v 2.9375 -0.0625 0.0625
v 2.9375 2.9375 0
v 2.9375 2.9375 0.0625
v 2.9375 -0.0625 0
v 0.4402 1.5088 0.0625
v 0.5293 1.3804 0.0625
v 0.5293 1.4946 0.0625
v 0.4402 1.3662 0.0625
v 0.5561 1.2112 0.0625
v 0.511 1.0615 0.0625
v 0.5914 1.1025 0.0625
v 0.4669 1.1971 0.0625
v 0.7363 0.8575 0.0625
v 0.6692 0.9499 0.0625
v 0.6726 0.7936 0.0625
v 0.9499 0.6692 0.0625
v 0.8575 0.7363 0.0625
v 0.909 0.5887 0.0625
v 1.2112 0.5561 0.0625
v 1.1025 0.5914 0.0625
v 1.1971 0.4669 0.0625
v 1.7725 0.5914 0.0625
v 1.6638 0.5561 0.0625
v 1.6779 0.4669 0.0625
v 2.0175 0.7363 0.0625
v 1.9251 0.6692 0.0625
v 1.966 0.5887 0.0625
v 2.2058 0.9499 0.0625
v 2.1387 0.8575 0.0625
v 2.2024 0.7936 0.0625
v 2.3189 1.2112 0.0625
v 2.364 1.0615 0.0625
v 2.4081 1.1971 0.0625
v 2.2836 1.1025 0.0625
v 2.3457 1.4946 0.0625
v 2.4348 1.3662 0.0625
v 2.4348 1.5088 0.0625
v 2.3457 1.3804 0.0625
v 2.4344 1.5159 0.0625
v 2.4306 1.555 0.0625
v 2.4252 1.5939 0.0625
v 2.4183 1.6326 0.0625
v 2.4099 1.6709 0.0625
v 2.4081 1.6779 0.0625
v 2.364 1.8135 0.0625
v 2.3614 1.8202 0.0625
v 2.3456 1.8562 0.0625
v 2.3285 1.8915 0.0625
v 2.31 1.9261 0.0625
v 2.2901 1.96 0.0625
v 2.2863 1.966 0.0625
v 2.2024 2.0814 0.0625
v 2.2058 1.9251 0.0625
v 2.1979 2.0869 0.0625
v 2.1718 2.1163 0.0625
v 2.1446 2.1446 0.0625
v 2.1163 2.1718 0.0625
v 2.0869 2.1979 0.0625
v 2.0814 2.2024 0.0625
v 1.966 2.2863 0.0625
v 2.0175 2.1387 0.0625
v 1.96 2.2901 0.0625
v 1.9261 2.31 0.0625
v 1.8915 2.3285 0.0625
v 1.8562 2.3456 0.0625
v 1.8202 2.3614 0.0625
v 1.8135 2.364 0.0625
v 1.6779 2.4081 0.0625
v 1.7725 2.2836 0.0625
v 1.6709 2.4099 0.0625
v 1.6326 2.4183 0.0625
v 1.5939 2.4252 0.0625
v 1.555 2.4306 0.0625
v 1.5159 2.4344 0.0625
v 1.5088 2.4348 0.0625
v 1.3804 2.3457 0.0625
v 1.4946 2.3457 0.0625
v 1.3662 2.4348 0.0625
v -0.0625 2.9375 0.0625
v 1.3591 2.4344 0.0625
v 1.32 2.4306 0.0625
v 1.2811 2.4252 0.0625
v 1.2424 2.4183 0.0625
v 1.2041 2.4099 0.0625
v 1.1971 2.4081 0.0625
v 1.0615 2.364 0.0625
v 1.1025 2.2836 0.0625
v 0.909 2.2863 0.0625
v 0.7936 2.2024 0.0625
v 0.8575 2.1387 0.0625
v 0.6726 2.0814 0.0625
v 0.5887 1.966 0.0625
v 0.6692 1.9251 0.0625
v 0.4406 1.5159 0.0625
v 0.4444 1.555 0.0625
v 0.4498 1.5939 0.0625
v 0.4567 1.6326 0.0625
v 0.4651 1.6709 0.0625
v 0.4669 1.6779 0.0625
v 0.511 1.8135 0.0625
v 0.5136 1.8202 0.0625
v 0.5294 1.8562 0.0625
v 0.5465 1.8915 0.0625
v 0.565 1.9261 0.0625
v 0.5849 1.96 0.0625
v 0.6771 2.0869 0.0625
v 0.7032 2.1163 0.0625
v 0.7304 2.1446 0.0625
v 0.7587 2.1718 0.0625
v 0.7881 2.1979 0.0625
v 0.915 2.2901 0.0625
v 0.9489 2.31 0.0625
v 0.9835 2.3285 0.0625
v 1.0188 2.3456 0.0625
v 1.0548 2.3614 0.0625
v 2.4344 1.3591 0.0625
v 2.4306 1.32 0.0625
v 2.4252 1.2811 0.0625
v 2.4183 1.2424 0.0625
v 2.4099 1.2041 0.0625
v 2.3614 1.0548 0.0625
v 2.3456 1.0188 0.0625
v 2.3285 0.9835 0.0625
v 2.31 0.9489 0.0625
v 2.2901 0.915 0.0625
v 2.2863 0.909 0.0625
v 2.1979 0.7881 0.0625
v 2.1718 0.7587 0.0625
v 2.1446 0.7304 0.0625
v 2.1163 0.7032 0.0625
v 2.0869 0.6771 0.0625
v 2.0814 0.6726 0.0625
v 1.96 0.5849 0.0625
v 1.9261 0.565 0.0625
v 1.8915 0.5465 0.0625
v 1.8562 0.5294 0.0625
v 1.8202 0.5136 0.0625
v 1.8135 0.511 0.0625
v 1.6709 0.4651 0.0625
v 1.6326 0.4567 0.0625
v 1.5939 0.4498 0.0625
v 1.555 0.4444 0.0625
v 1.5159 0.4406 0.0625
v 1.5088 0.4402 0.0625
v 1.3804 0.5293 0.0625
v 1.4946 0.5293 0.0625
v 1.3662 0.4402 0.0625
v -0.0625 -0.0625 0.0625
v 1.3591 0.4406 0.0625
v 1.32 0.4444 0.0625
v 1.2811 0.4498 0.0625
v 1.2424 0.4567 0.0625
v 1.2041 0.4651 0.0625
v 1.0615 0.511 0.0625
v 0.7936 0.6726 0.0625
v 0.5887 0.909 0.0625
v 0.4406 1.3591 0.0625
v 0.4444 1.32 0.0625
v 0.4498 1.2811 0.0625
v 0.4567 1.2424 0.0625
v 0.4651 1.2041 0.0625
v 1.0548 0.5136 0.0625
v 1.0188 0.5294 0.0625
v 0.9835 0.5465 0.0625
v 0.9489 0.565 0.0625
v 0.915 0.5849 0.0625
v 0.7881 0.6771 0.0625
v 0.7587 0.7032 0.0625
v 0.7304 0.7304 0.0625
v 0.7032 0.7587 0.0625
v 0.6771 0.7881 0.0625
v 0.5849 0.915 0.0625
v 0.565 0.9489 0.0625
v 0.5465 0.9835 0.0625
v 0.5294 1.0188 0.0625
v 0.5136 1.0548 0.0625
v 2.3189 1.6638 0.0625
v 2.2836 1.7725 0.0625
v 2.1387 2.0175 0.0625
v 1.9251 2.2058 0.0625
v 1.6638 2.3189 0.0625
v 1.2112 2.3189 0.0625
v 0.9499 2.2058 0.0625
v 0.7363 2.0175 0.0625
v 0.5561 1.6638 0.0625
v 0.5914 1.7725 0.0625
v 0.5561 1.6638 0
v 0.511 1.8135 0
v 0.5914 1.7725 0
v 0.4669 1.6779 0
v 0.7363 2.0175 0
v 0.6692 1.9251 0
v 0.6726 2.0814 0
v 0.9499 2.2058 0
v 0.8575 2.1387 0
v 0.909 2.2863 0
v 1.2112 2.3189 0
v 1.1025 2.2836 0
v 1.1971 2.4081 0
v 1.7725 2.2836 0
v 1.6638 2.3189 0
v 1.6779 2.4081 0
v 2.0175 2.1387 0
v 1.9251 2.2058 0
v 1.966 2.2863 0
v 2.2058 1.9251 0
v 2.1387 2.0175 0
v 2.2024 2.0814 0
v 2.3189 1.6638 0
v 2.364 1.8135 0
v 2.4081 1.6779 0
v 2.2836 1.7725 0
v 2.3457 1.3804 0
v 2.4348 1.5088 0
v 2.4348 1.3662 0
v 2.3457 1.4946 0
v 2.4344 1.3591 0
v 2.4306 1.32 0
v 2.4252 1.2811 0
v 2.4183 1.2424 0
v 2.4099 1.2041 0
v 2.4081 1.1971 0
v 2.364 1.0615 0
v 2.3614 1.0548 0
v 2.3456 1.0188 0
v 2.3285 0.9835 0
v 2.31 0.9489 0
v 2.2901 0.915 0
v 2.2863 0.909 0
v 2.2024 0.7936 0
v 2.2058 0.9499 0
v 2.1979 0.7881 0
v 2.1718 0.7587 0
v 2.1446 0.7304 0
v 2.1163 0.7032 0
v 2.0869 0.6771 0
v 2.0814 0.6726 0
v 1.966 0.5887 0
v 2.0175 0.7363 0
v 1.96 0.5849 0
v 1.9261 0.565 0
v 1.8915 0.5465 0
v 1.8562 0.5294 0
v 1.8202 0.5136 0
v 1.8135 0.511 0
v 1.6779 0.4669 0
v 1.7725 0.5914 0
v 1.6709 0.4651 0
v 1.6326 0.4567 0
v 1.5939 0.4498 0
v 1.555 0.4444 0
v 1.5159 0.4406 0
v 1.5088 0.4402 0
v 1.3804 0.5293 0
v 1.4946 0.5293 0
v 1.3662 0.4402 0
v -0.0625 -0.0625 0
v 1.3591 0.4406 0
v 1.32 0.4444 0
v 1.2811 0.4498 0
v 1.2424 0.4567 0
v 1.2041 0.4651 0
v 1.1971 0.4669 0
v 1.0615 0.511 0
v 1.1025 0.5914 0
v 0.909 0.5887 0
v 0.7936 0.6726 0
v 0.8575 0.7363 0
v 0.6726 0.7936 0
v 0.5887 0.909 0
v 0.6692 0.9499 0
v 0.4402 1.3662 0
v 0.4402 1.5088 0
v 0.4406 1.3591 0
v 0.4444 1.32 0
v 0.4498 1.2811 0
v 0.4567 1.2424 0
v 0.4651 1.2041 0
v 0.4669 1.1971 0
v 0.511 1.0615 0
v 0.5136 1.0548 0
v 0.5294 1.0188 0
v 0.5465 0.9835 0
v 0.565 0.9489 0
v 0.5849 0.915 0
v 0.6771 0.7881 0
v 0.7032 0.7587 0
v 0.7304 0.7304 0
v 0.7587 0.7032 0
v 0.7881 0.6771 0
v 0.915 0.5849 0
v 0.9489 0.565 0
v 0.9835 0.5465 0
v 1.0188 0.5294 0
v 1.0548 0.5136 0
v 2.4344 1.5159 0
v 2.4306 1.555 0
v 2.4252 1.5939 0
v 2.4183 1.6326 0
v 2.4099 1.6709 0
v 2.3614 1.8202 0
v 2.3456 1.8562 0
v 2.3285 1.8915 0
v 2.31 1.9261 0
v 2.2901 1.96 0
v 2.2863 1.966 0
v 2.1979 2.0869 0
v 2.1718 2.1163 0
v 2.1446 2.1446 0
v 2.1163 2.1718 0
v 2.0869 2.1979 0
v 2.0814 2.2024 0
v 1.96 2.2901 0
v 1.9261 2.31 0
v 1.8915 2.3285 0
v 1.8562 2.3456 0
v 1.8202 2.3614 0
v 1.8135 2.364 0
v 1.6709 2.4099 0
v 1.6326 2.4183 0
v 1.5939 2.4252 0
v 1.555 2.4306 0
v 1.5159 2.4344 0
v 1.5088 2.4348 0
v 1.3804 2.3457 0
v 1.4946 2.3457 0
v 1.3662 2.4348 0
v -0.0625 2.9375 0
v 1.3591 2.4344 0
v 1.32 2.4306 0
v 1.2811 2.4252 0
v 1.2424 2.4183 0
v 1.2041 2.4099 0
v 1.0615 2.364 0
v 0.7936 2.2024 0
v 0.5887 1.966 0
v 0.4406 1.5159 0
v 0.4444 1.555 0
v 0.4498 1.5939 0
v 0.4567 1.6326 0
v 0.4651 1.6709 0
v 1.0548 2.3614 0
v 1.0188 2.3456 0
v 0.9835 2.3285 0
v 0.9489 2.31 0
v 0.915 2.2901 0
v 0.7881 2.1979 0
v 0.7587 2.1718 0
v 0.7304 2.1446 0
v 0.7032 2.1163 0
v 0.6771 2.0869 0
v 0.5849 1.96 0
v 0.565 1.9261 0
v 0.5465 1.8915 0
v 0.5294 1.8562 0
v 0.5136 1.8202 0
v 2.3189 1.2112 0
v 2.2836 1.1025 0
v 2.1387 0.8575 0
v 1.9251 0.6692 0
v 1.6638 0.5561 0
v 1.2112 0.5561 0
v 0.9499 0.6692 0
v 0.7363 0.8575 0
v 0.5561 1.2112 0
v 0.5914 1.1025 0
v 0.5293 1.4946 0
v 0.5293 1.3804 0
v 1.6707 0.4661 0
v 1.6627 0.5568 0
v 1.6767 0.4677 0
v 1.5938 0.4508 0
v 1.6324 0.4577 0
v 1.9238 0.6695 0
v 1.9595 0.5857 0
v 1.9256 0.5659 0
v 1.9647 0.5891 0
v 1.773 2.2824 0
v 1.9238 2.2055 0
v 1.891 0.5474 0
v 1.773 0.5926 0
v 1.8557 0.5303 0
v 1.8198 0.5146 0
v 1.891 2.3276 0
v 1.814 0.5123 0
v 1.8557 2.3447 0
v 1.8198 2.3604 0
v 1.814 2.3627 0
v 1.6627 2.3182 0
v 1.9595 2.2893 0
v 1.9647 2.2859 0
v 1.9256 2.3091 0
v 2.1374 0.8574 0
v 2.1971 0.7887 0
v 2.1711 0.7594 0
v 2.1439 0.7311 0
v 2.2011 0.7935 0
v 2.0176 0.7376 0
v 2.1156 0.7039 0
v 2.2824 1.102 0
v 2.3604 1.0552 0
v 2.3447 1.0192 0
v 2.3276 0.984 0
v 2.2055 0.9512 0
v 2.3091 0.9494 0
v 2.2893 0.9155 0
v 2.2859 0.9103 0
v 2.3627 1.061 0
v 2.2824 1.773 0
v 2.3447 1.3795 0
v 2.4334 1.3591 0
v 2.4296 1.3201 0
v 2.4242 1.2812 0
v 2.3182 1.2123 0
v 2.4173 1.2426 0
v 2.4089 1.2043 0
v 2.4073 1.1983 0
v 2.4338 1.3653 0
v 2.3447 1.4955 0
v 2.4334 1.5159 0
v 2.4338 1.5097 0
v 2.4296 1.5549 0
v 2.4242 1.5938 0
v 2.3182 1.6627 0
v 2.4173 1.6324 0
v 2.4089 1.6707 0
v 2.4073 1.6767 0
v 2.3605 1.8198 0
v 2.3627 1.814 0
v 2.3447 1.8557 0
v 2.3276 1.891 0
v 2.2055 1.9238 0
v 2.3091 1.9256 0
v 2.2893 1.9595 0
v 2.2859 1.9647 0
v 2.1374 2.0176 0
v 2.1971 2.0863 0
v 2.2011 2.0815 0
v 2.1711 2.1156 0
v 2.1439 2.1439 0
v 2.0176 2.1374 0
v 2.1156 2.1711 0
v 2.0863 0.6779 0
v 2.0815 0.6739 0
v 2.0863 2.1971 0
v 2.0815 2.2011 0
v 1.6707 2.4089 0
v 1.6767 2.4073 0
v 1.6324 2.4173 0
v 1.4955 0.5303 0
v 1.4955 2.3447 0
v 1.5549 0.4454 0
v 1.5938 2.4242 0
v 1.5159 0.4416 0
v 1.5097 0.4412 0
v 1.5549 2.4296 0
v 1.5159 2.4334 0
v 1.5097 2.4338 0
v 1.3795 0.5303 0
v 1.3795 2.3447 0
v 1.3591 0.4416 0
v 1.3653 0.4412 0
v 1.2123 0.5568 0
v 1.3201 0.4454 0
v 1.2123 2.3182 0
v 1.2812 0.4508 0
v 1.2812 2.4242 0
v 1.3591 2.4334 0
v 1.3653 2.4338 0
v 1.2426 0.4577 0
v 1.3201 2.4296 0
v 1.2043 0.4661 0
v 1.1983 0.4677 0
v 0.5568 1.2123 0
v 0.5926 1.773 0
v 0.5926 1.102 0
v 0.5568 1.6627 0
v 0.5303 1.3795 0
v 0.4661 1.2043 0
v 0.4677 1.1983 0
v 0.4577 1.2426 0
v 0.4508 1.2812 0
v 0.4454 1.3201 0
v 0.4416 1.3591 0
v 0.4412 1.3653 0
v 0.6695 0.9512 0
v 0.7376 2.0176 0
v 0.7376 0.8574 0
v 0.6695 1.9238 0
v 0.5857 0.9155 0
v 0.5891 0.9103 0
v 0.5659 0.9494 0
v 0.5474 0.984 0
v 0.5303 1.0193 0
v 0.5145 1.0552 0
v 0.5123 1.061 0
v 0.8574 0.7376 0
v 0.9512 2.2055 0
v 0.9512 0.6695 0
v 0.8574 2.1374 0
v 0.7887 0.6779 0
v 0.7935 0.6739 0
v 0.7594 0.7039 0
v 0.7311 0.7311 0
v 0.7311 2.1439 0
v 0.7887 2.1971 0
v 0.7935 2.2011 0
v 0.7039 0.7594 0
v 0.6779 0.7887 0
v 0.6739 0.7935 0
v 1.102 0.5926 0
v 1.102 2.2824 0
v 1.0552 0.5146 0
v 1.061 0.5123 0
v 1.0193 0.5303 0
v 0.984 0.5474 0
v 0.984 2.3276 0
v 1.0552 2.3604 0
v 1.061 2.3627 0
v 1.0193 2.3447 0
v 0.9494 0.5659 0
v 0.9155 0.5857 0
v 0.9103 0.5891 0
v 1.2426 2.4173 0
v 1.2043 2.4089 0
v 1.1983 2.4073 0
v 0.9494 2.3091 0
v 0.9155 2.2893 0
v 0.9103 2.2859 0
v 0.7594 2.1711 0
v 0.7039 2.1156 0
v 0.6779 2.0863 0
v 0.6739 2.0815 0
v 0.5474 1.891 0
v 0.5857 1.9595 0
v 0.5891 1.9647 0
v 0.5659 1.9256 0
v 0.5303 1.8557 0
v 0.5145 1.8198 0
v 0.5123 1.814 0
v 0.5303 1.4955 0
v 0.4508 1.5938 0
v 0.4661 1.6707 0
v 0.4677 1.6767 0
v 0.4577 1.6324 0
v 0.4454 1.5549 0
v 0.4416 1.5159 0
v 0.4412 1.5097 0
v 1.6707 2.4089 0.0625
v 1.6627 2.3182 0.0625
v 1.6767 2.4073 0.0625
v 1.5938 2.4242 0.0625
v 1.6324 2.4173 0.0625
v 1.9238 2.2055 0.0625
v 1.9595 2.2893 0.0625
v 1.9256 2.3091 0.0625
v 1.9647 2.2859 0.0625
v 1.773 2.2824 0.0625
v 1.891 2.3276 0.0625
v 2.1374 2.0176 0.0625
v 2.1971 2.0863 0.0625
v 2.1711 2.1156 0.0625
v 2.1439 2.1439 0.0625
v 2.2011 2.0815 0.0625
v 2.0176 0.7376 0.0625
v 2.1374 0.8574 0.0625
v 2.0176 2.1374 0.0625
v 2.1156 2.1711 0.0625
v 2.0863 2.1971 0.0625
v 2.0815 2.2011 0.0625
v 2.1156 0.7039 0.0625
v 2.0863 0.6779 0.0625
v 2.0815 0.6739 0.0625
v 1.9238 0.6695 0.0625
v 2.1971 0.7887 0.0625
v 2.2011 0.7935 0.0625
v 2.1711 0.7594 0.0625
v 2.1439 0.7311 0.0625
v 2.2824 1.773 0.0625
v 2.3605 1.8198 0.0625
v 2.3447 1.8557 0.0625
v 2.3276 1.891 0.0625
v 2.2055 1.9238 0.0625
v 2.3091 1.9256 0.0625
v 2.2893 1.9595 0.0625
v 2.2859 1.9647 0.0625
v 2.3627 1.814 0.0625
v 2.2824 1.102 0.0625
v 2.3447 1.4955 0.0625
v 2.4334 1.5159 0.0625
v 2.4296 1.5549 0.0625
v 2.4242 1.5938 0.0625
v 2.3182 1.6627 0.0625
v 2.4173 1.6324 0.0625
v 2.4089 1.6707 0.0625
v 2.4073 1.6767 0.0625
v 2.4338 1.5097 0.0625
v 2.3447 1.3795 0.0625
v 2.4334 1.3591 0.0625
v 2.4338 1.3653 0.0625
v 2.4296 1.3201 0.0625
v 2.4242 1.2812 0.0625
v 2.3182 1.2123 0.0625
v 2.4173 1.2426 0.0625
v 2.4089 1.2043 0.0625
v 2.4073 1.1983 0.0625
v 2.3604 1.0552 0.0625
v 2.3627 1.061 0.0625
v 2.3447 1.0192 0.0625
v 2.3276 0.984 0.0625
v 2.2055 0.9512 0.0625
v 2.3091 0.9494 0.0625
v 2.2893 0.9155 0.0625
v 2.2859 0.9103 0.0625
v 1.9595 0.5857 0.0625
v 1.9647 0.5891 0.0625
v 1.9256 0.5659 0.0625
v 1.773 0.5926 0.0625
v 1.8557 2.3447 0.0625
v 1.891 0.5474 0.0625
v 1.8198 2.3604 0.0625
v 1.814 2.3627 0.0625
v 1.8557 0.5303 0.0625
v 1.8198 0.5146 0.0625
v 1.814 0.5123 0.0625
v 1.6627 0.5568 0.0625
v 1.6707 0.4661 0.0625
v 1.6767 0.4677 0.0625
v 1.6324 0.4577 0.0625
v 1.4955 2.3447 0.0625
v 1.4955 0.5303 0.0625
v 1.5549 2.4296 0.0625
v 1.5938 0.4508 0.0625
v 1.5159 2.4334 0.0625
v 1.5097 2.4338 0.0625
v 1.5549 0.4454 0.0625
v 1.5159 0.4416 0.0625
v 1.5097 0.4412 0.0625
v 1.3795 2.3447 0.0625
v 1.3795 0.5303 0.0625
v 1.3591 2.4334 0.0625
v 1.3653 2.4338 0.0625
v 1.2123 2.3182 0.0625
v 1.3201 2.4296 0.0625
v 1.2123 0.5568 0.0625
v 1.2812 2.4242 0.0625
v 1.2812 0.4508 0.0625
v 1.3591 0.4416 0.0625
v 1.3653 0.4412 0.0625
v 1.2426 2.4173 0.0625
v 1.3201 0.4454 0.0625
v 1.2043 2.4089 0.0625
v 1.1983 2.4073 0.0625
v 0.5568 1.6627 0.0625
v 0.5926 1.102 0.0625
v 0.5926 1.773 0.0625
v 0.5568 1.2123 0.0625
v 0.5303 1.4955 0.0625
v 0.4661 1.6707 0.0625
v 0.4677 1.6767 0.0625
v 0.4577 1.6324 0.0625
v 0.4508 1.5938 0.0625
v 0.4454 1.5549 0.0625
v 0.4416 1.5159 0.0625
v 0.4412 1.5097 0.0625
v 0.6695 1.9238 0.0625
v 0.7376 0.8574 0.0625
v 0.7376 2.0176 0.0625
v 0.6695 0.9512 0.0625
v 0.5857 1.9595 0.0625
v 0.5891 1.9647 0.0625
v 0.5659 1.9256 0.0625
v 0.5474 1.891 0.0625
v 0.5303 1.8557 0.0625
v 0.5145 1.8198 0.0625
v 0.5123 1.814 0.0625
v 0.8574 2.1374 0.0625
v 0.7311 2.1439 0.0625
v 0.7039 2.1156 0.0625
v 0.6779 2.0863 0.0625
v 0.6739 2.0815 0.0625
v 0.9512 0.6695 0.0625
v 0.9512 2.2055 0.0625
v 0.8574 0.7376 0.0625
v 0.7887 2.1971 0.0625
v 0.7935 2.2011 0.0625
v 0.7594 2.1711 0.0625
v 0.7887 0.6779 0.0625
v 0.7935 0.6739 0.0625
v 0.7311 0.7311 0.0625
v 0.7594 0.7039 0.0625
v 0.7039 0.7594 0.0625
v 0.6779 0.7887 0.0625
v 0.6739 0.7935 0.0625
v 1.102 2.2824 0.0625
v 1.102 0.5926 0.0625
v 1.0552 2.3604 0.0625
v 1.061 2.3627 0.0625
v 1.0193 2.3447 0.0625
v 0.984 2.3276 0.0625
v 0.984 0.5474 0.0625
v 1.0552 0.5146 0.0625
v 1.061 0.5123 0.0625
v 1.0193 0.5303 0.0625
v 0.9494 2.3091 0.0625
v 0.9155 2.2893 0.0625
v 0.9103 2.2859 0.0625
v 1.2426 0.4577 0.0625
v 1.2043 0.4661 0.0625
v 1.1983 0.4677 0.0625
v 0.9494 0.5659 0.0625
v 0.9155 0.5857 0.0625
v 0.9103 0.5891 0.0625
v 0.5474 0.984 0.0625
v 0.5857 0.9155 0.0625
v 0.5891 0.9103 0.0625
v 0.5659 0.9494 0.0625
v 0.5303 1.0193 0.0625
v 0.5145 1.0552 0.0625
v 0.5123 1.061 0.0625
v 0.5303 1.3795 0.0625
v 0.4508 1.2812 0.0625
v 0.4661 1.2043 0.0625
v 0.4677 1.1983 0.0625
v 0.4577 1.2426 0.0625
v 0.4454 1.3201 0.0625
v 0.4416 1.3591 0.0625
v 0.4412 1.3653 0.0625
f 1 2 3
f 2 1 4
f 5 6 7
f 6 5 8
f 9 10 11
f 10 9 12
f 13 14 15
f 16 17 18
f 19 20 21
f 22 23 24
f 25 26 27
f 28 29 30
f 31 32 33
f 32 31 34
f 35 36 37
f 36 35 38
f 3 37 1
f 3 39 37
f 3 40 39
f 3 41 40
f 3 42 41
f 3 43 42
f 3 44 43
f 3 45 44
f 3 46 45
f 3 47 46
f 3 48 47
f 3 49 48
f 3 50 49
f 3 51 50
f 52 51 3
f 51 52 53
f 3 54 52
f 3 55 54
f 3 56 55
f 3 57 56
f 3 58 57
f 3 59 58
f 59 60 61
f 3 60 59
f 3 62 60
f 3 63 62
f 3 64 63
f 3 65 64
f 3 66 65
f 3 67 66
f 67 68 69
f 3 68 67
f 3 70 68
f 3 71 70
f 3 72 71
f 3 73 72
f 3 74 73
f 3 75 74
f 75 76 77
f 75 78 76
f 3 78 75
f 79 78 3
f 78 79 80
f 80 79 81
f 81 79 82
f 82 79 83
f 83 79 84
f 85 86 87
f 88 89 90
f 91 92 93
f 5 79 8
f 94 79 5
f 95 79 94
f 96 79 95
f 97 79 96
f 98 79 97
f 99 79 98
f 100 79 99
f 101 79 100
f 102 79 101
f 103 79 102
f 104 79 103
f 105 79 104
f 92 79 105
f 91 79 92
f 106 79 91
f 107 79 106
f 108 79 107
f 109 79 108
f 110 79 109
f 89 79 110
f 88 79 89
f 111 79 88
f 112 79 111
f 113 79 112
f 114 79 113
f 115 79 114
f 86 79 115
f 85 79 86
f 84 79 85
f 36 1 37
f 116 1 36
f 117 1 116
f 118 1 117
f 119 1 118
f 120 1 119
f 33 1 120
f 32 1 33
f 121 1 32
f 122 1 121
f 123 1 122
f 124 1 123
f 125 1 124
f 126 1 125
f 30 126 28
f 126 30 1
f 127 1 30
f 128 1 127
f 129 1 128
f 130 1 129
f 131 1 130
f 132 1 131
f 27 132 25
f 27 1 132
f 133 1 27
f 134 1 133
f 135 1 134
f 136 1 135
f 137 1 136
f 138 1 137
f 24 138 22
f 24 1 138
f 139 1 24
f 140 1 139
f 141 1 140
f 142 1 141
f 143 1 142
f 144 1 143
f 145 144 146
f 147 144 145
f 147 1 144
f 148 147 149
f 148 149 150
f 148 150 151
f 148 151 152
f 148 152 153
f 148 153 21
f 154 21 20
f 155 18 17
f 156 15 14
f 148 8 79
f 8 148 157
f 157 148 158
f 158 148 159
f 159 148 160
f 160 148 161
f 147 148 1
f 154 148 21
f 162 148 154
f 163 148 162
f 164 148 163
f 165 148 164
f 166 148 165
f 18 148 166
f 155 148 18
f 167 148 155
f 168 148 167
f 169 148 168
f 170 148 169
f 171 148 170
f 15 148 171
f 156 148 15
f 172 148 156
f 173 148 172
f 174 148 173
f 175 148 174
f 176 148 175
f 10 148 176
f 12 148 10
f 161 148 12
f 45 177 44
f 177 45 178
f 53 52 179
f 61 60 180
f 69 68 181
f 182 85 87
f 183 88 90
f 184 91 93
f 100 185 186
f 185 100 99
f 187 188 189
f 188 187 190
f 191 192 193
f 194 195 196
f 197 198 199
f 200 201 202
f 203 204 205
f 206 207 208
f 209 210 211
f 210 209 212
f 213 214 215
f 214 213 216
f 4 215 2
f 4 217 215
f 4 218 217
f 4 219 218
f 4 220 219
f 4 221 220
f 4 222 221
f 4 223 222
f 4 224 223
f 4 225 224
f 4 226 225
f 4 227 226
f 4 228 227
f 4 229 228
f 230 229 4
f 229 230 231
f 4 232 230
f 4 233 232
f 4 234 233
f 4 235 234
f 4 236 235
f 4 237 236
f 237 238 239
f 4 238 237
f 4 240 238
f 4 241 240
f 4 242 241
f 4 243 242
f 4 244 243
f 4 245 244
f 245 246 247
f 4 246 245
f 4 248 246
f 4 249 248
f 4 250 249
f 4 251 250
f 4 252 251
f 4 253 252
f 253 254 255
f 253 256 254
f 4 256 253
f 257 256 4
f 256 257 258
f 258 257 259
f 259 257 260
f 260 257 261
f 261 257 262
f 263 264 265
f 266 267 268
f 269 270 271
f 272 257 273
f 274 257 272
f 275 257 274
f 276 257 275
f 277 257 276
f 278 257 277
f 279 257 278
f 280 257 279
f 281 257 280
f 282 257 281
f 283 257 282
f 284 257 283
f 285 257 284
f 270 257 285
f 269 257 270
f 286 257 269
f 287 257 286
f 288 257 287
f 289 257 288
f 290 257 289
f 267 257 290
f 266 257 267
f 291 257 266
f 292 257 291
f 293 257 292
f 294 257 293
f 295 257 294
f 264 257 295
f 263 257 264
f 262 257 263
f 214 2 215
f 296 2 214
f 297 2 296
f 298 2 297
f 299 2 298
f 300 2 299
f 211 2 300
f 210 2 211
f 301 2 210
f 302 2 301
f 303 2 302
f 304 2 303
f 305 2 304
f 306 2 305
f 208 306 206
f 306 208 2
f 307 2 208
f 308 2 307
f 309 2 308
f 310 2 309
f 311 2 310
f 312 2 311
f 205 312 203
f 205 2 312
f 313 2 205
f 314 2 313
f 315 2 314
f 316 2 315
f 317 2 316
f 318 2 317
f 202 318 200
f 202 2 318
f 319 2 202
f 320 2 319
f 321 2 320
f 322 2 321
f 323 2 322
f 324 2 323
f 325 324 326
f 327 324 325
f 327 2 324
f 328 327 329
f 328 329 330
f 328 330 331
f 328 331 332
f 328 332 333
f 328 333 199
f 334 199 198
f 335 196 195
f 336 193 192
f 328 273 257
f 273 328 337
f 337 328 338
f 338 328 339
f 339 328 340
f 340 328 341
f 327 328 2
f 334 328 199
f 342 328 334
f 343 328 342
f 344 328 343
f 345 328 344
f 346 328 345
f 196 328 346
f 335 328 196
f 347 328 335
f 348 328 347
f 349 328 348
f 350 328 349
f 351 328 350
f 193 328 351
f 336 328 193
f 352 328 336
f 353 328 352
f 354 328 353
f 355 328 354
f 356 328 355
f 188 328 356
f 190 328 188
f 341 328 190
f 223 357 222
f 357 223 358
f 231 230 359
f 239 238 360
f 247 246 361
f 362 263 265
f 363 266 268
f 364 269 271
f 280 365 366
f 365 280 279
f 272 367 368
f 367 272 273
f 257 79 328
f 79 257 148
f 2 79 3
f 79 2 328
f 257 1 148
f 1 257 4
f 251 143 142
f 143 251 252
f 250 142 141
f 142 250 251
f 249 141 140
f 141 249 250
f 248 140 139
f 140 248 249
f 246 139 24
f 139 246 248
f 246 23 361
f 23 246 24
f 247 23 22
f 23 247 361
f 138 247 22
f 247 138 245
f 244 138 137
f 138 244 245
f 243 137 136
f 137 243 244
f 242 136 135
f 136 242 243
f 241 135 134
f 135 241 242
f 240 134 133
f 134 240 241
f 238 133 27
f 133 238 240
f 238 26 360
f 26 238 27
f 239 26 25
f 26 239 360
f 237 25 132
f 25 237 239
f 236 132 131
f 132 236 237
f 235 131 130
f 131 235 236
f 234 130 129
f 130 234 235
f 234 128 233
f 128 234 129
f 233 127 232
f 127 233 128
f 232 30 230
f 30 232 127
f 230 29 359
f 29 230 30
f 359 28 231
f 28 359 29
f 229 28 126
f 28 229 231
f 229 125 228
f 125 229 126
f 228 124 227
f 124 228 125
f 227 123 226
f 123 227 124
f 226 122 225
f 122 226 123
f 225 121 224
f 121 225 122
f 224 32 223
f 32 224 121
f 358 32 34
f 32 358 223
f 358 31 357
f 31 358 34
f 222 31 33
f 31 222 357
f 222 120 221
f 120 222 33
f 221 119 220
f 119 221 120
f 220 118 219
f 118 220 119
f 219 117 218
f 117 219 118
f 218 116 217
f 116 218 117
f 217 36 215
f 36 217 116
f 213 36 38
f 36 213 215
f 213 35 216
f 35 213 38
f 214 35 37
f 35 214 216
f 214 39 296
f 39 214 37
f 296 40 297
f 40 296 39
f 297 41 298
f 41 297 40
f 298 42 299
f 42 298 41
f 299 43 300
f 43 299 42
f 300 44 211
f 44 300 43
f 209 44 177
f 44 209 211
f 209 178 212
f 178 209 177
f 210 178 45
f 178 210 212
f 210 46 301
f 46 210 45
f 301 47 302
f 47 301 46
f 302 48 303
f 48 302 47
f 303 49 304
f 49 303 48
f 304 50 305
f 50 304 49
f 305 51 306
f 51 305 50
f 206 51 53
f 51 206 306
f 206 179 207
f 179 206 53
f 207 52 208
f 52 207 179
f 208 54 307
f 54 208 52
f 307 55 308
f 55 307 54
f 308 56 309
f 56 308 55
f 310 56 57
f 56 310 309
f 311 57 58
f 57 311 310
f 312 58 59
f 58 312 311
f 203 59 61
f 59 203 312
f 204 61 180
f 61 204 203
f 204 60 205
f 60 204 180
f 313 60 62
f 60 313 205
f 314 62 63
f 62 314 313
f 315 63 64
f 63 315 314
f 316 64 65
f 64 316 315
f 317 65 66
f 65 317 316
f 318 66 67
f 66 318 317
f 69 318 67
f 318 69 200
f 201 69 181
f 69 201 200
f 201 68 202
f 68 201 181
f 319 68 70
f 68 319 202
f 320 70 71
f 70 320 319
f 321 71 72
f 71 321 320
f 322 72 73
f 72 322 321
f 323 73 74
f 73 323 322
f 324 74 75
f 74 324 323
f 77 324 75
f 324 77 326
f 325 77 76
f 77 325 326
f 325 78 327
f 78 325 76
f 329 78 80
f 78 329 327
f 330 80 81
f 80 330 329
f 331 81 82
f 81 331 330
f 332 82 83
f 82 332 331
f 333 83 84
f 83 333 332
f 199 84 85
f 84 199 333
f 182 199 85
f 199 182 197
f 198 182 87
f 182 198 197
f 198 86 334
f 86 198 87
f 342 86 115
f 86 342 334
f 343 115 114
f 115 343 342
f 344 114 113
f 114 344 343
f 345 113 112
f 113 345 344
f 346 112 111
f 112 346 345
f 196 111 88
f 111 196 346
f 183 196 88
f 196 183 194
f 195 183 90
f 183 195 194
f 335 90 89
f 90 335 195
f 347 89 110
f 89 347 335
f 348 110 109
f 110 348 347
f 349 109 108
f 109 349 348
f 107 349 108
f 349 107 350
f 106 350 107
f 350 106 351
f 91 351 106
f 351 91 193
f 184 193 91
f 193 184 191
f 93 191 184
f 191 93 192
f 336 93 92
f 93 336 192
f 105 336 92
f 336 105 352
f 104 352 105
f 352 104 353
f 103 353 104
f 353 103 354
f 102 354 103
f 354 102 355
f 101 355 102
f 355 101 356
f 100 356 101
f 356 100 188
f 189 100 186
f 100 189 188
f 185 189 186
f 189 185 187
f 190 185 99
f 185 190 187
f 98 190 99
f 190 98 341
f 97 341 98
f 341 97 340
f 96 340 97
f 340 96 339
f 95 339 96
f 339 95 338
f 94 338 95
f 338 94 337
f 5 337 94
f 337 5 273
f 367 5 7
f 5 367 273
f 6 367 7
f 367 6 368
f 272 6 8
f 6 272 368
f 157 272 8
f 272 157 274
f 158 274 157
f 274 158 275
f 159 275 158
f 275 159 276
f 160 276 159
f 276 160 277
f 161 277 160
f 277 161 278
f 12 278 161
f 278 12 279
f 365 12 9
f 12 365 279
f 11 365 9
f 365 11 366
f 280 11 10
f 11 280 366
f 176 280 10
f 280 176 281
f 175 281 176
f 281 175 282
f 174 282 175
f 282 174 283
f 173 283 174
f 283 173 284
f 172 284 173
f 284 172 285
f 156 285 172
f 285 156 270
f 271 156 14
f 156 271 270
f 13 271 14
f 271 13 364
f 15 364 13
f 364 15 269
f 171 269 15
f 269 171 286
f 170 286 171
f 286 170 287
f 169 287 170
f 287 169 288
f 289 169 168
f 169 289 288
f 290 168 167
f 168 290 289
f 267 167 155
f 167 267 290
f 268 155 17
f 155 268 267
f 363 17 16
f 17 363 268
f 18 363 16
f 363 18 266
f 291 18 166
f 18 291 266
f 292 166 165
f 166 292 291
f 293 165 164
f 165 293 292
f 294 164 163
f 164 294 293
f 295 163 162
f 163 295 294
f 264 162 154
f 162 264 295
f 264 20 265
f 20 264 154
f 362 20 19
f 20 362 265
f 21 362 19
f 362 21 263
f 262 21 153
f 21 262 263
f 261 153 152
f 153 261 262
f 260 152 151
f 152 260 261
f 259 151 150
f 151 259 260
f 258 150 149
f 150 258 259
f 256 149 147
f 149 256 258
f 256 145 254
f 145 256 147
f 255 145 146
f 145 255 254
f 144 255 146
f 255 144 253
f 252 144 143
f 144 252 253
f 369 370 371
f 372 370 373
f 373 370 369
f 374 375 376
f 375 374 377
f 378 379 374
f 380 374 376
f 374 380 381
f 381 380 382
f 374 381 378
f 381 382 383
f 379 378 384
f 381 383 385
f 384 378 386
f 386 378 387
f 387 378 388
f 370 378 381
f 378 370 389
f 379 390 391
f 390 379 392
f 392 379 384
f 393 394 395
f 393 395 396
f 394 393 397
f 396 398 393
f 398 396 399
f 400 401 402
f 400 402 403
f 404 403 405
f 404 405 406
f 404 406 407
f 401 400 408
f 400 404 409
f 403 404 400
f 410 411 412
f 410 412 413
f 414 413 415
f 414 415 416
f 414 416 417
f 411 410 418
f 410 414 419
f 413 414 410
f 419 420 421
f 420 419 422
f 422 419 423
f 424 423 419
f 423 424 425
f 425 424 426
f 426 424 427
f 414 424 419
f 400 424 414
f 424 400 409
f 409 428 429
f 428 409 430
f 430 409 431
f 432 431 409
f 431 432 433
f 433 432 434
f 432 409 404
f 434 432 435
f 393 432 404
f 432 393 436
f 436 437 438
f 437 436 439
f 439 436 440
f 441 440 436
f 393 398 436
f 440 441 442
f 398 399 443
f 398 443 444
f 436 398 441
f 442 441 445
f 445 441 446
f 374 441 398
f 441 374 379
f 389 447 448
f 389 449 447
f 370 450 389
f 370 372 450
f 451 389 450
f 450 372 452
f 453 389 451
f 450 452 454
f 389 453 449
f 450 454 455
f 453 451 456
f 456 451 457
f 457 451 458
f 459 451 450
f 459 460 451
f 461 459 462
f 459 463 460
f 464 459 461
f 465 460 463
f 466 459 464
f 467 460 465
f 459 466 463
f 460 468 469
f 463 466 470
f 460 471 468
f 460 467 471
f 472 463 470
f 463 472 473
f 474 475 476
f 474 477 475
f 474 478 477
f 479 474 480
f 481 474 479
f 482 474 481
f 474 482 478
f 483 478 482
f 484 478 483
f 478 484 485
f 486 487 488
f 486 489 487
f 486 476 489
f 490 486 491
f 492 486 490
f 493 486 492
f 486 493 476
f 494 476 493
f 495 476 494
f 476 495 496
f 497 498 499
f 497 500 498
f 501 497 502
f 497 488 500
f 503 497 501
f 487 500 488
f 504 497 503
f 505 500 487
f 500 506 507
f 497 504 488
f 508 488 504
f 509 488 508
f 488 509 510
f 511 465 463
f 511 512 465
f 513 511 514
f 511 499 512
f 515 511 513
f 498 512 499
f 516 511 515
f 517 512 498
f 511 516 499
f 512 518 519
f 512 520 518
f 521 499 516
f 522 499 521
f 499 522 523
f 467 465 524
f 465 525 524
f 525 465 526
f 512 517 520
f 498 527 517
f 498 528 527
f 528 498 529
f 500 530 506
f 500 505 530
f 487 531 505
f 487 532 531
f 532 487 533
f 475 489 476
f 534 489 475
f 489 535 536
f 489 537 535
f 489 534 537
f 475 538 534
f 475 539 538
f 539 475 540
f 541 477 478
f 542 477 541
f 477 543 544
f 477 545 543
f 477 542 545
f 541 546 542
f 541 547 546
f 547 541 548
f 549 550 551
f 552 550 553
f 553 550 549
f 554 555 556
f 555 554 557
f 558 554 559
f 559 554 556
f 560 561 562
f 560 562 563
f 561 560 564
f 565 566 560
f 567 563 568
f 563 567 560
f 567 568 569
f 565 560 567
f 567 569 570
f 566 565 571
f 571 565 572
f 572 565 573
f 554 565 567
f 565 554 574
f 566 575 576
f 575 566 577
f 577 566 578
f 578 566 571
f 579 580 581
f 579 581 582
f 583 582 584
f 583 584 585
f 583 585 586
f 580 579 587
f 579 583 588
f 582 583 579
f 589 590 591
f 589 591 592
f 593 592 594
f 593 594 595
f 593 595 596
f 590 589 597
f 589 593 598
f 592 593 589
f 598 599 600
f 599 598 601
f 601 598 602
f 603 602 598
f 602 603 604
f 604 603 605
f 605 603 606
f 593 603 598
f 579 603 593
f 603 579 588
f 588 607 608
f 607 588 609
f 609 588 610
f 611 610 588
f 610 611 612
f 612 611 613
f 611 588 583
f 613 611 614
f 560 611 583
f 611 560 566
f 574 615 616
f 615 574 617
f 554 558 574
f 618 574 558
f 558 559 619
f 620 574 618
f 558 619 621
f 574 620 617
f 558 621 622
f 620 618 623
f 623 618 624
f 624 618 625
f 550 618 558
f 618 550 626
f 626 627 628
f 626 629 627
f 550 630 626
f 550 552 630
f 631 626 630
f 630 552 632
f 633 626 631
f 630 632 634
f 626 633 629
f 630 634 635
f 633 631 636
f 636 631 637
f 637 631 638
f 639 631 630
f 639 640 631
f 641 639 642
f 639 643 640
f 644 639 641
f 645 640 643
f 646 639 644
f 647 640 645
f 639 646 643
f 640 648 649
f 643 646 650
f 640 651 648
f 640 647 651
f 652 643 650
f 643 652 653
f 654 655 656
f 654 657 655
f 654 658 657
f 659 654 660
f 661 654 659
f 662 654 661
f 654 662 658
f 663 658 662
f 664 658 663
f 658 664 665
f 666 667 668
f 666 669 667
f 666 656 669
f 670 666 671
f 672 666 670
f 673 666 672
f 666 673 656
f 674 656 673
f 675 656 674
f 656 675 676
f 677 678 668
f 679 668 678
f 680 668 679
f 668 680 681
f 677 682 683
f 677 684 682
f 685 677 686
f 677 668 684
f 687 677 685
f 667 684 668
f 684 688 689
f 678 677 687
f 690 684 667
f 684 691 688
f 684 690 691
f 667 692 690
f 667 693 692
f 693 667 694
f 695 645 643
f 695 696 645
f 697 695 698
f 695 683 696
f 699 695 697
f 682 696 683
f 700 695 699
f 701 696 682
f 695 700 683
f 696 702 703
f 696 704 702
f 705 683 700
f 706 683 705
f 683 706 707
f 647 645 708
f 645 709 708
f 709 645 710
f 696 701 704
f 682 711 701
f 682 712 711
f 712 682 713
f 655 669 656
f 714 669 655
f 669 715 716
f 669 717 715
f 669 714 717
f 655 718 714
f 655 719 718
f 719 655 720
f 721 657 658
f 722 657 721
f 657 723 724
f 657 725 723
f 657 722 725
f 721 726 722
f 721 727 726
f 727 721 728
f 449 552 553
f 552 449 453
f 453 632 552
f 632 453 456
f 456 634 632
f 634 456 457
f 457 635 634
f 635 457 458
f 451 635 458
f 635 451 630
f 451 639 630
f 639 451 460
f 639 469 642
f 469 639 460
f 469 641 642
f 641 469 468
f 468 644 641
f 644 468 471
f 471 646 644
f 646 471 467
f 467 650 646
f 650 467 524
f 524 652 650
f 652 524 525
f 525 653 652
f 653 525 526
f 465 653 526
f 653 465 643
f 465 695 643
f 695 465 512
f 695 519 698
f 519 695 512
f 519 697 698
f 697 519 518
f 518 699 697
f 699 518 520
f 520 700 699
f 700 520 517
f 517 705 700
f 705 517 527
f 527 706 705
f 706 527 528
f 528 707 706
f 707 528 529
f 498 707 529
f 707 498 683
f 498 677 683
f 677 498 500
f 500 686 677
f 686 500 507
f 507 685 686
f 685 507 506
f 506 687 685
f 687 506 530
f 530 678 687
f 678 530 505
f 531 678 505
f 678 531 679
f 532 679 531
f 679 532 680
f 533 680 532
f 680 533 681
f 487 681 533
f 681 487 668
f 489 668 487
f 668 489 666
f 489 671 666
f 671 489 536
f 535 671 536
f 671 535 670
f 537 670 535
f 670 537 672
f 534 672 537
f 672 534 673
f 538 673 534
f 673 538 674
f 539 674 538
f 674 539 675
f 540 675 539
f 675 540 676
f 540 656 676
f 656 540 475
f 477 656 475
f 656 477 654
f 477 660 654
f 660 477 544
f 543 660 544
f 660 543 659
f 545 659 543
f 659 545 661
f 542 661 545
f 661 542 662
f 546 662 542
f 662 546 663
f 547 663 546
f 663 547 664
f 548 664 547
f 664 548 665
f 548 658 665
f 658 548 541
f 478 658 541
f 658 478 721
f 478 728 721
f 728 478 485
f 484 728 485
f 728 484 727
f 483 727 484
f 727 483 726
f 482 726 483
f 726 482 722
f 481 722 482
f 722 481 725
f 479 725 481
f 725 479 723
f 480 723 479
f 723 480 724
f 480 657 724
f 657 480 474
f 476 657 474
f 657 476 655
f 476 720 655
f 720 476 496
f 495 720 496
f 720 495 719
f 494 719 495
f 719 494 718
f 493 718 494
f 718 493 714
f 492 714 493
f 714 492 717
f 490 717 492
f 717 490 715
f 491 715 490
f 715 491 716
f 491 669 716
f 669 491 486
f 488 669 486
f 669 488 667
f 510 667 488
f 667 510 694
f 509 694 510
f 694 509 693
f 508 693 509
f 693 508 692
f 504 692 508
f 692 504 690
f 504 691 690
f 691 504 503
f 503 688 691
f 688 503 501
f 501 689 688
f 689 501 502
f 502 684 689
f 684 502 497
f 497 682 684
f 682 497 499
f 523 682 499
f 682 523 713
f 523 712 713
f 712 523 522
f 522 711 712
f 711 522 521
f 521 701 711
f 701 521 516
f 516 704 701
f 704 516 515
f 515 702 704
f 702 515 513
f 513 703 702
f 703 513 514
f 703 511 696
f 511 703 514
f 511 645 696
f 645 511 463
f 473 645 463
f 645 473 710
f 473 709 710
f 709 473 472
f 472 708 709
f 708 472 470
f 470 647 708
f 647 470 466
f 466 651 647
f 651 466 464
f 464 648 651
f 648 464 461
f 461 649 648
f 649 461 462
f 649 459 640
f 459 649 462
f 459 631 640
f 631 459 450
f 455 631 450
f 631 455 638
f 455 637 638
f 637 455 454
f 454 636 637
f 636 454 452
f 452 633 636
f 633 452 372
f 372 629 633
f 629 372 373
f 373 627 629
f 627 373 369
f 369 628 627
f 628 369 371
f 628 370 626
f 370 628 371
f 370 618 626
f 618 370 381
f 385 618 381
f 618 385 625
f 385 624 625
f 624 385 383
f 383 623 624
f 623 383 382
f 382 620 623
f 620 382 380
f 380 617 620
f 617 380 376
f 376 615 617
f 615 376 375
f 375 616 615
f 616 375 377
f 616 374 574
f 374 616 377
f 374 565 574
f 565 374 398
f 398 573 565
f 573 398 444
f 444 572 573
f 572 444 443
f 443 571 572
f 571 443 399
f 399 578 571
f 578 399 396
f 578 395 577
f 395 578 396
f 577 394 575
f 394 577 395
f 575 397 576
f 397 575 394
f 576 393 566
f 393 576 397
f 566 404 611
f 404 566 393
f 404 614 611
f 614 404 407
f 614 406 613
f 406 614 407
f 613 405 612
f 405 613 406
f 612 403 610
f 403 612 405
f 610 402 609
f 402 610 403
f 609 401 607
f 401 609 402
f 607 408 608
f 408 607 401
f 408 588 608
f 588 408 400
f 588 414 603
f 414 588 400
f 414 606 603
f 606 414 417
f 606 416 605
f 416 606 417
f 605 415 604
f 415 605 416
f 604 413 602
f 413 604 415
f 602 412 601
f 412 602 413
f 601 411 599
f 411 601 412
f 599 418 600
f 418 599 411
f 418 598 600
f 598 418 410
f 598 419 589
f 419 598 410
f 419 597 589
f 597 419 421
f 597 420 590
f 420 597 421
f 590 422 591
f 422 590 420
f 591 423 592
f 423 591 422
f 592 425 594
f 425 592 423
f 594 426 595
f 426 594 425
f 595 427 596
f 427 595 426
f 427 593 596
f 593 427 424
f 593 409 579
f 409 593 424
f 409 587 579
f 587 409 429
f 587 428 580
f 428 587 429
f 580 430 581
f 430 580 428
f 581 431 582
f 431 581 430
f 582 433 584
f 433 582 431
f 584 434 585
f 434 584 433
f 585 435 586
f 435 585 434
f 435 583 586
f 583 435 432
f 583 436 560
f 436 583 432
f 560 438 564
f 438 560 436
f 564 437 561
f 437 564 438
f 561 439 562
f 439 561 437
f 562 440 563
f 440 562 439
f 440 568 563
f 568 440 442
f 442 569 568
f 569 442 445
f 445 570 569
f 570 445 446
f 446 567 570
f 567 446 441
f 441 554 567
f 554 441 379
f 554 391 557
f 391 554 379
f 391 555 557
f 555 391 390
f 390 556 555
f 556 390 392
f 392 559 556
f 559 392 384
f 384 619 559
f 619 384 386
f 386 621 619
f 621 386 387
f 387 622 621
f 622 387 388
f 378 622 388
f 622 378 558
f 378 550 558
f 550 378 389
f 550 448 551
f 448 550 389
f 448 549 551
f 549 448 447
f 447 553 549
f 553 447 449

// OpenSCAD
// file: sub_innergears.scad
// sub_innergears.scad — shared inner gear ring (ring with inward-pointing teeth)
// Requires caller to define: plate_w, plate_d, plate_h (see sub_base_plate.scad)
// Units: inches
//
// Usage — must be `include`, positioned after sub_base_plate.scad and before any
// code that references gear_r_tip/gear_r_root/gear_r_bore:
//   include <sub_base_plate.scad>
//   include <sub_innergears.scad>
//   gear("darkred");
//   gear_bore("lightgray");
//
// gear(c) and gear_bore(c) take a color string so tiles with different gear
// colors (e.g. darkred vs darkgreen) can share this same file.

gear_r_tip  = 1.18;   // outer edge of ring (plain)
gear_r_root = 1.00;   // ring inner edge; teeth root here
gear_r_bore = 0.82;   // bore radius / tooth tip depth
gear_n      = 20;
tooth_hw    = 4.5;
tooth_tip_f = 0.80;

// ── Gear 2D helpers ───────────────────────────────────────────────────────────

module gear_tooth_2d() {
    shift   = (gear_r_root - gear_r_bore) / 2;
    r_outer = gear_r_root + shift;
    r_inner = gear_r_bore + shift;
    polygon([
        [r_outer * cos(-tooth_hw),               r_outer * sin(-tooth_hw)],
        [r_inner * cos(-tooth_hw * tooth_tip_f),  r_inner * sin(-tooth_hw * tooth_tip_f)],
        [r_inner * cos( tooth_hw * tooth_tip_f),  r_inner * sin( tooth_hw * tooth_tip_f)],
        [r_outer * cos( tooth_hw),               r_outer * sin( tooth_hw)],
    ]);
}

module gear_2d() {
    circle(r = gear_r_tip, $fn = 160);
}

module bore_2d() {
    pitch = 360 / gear_n;
    difference() {
        circle(r = gear_r_root, $fn = 160);
        for (i = [0:gear_n - 1]) rotate([0, 0, i * pitch]) gear_tooth_2d();
    }
}

// ── Gear holes & gear ────────────────────────────────────────────────────────

module gear_holes() {
    translate([plate_w / 2, plate_d / 2, -1])
    linear_extrude(plate_h + 2)
    difference() {
        gear_2d();
        bore_2d();
    }
}

module gear(c) {
    color(c)
    translate([plate_w / 2, plate_d / 2, 0])
    linear_extrude(plate_h)
    difference() { gear_2d(); bore_2d(); }
}

// ── Gear bore hole & gear bore ────────────────────────────────────────────────

module gear_bore_holes() {
    translate([plate_w / 2, plate_d / 2, -1])
    linear_extrude(plate_h + 2)
    bore_2d();
}

module gear_bore(c) {
    color(c)
    translate([plate_w / 2, plate_d / 2, 0])
    linear_extrude(plate_h)
    offset(delta = -0.001) bore_2d();
}
// file: sub_base_plate.scad
// sub_base_plate.scad — shared tile-building blocks: plate, rivets, edge ID marks,
// and the common plate/hole dimensional constants used by every tile.
// Units: inches
//
// Usage — must be `include`, not `use`, and the include line must come
// before any code in the caller that references plate_w/plate_d/plate_h/
// frame_w/hole_d/hole_r: a variable defined only inside an included file is
// invisible to code positioned before the include statement.
//   include <sub_base_plate.scad>
//   plate(["red", undef, "blue", undef, undef, "green"]);
//
// plate(colors) is the main entry point: it builds the complete base tile in
// one call — the frame with edge ID marks, the darkgray plate, and the
// lightgray rivet ring (40 rivets, 10 per side, corners shared). colors is the
// same 6-slot frame_with_id() array described below.
//
// frame_with_id() colors are applied left-to-right (−x to +x), repeated
// identically on all four edges. Bottom and right edges read the array in
// reverse (slot 5-i) so the pattern stays consistent when the tile is flipped.
// Any position left as undef or omitted defaults to black. 6 regions span the
// straight run of each edge (corners always stay solid black). A thin black
// layer covers the marks on the top face; marks are visible from the edge.

plate_w = 2 + 7/8;
plate_d = 2 + 7/8;
plate_h = 1/16;
frame_w = 1/16;
hole_d  = 3/32;
hole_r  = hole_d / 2;

module rivet_holes() {
    spacing_x = plate_w / 10;
    spacing_y = plate_d / 10;
    inset_x   = spacing_x / 2;
    inset_y   = spacing_y / 2;
    for (i = [0:9]) translate([inset_x + i * spacing_x, inset_y,           -1]) cylinder(h = plate_h + 2, r = hole_r, $fn = 20);
    for (i = [0:9]) translate([inset_x + i * spacing_x, plate_d - inset_y, -1]) cylinder(h = plate_h + 2, r = hole_r, $fn = 20);
    for (i = [0:9]) translate([inset_x,           inset_y + i * spacing_y, -1]) cylinder(h = plate_h + 2, r = hole_r, $fn = 20);
    for (i = [0:9]) translate([plate_w - inset_x, inset_y + i * spacing_y, -1]) cylinder(h = plate_h + 2, r = hole_r, $fn = 20);
}

module rivets() {
    spacing_x = plate_w / 10;
    spacing_y = plate_d / 10;
    inset_x   = spacing_x / 2;
    inset_y   = spacing_y / 2;
    color("lightgray") {
        for (i = [0:9]) translate([inset_x + i * spacing_x, inset_y,           0]) cylinder(h = plate_h, r = hole_r, $fn = 20);
        for (i = [0:9]) translate([inset_x + i * spacing_x, plate_d - inset_y, 0]) cylinder(h = plate_h, r = hole_r, $fn = 20);
        for (i = [0:9]) translate([inset_x,           inset_y + i * spacing_y, 0]) cylinder(h = plate_h, r = hole_r, $fn = 20);
        for (i = [0:9]) translate([plate_w - inset_x, inset_y + i * spacing_y, 0]) cylinder(h = plate_h, r = hole_r, $fn = 20);
    }
}

module frame_with_id(colors = []) {
    id_cover = plate_h / 8;
    region_w = plate_w / 6;
    region_d = plate_d / 6;
    mark_h   = plate_h - id_cover;

    color("black")
    difference() {
        translate([-frame_w, -frame_w, 0])
            cube([plate_w + 2 * frame_w, plate_d + 2 * frame_w, plate_h]);
        translate([0, 0, -0.001])
            cube([plate_w, plate_d, plate_h + 0.002]);
        // top/bottom/left/right straight runs only — corners stay solid black
        translate([0, plate_d - 0.001, -0.001])
            cube([plate_w, frame_w + 0.002, plate_h + 0.002]);
        translate([0, -frame_w - 0.001, -0.001])
            cube([plate_w, frame_w + 0.002, plate_h + 0.002]);
        translate([-frame_w - 0.001, 0, -0.001])
            cube([frame_w + 0.002, plate_d, plate_h + 0.002]);
        translate([plate_w - 0.001, 0, -0.001])
            cube([frame_w + 0.002, plate_d, plate_h + 0.002]);
    }

    for (i = [0:5]) {
        c     = (colors[i] != undef) ? colors[i] : "black";

        // top edge
        color(c) translate([i * region_w, plate_d, 0]) cube([region_w, frame_w, mark_h]);
        color("black") translate([i * region_w, plate_d, mark_h]) cube([region_w, frame_w, id_cover]);

        // bottom edge (reversed)
        color(c) translate([(5-i) * region_w, -frame_w, 0]) cube([region_w, frame_w, mark_h]);
        color("black") translate([(5-i) * region_w, -frame_w, mark_h]) cube([region_w, frame_w, id_cover]);

        // left edge
        color(c) translate([-frame_w, i * region_d, 0]) cube([frame_w, region_d, mark_h]);
        color("black") translate([-frame_w, i * region_d, mark_h]) cube([frame_w, region_d, id_cover]);

        // right edge (reversed)
        color(c) translate([plate_w, (5-i) * region_d, 0]) cube([frame_w, region_d, mark_h]);
        color("black") translate([plate_w, (5-i) * region_d, mark_h]) cube([frame_w, region_d, id_cover]);
    }
}

module plate(colors = []) {
    frame_with_id(colors);
    union() {
        difference() {
            color("darkgray") cube([plate_w, plate_d, plate_h]);
            rivet_holes();
        }
        rivets();
    }
}
// file: sub_element110.scad
// sub_element110.scad — shared assembly for element110 gear tile variants
// Requires caller to define: plate_colors (6-slot frame color array),
// label_num (digit painted in the gear bore)
// Units: inches

include <sub_base_plate.scad>
include <sub_innergears.scad>

// ── Label hole → label ────────────────────────────────────────────────────────

module label_holes(num) {
    translate([plate_w / 2, plate_d / 2, -0.001])
    linear_extrude(plate_h + 0.002)
    text(str(num), size = 1.1, halign = "center", valign = "center",
         font = "Liberation Sans:style=Bold");
}

module label(num, clr) {
    color(clr)
    translate([plate_w / 2, plate_d / 2, 0])
    linear_extrude(plate_h)
    text(str(num), size = 1.1, halign = "center", valign = "center",
         font = "Liberation Sans:style=Bold");
}

// ── Assembly ──────────────────────────────────────────────────────────────────
// Each level: difference() cuts the holes INTO the running assembly,
//             union() then adds the feature that fills those holes.
// Innermost = first step; outermost = last step.

union() {                                           // step 4: add label
    difference() {
        union() {                                   // step 3: add gear bore
            difference() {
                union() {                           // step 2: add gear
                    difference() {
                        plate(plate_colors);   // step 1: plate (frame + rivets)
                        gear_holes();
                    }
                    gear("darkgreen");
                }
                gear_bore_holes();
            }
            gear_bore("lightgray");
        }
        label_holes(label_num);
    }
    label(label_num, "green");
}
// main file
// element110-1.scad
// Gear tile variant — number "1" in the bore.
// Units: inches

plate_colors = [undef, "green", "green", "green", "green", "green"];
label_num    = 1;

include <sub_element110.scad>
